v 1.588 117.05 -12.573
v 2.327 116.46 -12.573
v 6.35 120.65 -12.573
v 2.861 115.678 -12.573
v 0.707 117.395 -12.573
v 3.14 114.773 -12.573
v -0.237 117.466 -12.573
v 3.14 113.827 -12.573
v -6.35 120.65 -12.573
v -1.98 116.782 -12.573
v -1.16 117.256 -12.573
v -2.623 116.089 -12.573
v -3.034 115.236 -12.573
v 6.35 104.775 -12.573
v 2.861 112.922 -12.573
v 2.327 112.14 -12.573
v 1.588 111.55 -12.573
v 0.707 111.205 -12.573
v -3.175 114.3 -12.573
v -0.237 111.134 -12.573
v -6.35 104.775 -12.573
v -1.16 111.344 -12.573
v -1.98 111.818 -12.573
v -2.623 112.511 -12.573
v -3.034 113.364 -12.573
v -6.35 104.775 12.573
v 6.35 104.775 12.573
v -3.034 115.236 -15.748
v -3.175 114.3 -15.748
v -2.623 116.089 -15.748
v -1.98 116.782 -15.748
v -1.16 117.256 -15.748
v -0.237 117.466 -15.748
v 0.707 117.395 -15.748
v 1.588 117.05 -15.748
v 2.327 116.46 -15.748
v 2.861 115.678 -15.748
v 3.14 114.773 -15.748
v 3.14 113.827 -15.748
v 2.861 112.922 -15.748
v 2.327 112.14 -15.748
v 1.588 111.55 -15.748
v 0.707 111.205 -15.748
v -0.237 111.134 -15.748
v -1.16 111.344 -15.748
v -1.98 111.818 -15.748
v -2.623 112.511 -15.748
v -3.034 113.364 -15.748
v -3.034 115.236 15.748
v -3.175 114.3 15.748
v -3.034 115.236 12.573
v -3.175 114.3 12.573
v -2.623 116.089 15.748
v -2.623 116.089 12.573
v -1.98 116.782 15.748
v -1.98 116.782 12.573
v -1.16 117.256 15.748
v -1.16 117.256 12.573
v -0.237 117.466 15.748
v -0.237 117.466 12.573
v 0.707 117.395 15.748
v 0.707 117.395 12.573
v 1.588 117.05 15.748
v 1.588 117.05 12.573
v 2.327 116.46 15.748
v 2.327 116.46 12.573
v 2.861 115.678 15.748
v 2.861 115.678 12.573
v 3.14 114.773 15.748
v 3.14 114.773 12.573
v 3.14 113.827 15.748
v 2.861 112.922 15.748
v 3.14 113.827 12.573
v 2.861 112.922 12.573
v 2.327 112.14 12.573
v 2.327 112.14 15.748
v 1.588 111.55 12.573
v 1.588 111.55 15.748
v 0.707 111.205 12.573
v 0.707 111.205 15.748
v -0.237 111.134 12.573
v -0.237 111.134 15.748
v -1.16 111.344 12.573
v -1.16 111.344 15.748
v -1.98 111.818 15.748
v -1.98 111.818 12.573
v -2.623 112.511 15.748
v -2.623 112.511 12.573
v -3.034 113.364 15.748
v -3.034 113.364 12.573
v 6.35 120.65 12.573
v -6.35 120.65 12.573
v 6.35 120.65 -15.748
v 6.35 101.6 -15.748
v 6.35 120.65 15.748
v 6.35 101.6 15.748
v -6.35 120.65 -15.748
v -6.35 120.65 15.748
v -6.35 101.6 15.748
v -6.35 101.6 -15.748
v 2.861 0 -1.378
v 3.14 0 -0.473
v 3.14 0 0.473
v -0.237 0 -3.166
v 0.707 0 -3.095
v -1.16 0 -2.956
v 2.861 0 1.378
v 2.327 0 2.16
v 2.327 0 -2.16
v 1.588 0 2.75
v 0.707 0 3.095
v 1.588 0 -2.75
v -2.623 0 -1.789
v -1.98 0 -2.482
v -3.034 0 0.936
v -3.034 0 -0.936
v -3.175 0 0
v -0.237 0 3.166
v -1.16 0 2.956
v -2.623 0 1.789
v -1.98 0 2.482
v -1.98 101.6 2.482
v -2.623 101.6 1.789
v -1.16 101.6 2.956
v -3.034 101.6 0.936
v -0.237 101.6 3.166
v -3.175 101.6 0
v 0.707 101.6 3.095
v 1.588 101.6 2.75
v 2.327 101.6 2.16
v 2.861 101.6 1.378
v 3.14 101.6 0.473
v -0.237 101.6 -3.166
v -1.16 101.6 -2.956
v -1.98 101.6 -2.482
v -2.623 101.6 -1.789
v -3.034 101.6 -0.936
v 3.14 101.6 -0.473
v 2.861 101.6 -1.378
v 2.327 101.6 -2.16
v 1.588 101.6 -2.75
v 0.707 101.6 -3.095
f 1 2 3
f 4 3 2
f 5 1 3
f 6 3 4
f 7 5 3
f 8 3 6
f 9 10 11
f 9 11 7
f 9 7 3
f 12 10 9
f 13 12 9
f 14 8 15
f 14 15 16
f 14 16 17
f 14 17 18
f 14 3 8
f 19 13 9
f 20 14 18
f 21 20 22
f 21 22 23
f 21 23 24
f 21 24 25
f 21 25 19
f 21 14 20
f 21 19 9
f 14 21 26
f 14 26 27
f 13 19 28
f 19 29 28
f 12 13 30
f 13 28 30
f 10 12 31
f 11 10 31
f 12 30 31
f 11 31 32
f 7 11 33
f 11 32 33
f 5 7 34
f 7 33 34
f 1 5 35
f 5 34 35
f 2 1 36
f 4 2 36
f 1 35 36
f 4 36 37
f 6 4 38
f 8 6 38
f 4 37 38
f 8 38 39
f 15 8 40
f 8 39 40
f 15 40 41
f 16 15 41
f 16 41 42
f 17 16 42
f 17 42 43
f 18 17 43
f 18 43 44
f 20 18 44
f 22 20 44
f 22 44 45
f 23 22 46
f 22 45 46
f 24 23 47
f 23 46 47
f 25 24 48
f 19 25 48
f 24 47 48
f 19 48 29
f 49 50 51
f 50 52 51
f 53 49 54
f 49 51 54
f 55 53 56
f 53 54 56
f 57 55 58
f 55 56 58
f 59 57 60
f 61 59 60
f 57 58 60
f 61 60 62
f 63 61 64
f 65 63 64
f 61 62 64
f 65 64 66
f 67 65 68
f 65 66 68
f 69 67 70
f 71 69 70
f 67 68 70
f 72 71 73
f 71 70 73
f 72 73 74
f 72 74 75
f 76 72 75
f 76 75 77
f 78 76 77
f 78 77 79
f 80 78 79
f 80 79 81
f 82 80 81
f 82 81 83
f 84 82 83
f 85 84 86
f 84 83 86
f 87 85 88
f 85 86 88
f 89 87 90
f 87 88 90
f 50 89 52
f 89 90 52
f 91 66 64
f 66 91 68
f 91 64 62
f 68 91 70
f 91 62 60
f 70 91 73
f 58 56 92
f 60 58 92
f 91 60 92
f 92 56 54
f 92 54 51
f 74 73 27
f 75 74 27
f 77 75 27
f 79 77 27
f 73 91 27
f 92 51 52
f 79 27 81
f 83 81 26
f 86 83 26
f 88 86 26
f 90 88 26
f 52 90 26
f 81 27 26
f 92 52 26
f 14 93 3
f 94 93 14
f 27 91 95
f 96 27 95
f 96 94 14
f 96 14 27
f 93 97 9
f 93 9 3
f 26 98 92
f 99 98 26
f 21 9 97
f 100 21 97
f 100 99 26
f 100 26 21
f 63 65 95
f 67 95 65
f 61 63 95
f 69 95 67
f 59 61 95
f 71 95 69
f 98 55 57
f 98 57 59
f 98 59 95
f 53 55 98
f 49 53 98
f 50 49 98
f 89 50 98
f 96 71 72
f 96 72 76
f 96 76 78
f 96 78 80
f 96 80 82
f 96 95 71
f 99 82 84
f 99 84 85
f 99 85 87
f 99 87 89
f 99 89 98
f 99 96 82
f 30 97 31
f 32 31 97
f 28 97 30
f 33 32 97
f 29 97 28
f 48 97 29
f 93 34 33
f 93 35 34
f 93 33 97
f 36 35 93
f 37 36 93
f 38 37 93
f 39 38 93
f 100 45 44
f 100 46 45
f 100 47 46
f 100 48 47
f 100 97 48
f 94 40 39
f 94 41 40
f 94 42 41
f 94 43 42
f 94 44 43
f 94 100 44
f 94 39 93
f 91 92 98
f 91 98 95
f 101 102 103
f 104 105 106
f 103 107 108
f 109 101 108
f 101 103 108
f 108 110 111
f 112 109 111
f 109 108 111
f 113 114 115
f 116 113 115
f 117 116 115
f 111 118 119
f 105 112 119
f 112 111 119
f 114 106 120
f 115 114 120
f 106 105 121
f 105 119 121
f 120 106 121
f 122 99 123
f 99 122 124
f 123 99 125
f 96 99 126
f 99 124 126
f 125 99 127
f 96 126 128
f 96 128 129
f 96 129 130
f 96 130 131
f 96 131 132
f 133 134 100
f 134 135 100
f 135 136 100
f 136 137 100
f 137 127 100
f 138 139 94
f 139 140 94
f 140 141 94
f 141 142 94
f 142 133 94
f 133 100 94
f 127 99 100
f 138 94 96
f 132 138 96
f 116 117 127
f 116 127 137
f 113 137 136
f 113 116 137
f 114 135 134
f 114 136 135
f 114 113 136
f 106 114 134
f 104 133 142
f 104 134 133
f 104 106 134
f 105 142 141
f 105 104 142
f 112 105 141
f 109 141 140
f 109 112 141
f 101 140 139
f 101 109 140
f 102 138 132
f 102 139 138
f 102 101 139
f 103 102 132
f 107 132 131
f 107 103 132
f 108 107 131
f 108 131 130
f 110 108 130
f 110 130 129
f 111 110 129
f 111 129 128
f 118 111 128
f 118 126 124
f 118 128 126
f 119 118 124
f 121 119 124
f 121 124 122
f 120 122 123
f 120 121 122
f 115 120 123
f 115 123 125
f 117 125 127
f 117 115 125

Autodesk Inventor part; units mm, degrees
ref_plane "YZ Plane" through (0, 0, 0) normal (1, 0, 0) x (0, 1, 0)
ref_plane "XZ Plane" through (0, 0, 0) normal (0, 1, 0) x (-1, 0, 0)
ref_plane "XY Plane" through (0, 0, 0) normal (0, 0, 1) x (1, 0, 0)
sketch "Sketch1" plane through (0, 0, 0) normal (0, 1, 0) x (-1, 0, 0)
  circle A0 centre (0, 0) radius 3.175
  dimension "d0" = 6.35
extrude "Extrusion1" add sketch "Sketch1" along normal blind 101.6
sketch "Sketch2" plane through (0, 101.6, 0) normal (0, 1, 0) x (1, 0, 0)
  line L0 (6.35, -15.748) -> (-6.35, -15.748)
  line L1 (-6.35, -15.748) -> (-6.35, 15.748)
  line L2 (-6.35, 15.748) -> (6.35, 15.748)
  line L3 (6.35, 15.748) -> (6.35, -15.748)
  line L4 (6.35, -15.748) -> (-6.35, 15.748) construction
  line L5 (-6.35, -15.748) -> (6.35, 15.748) construction
  point P0 (0, 0)
  dimension "d3" = 12.7
  dimension "d4" = 31.496
extrude "Extrusion2" add sketch "Sketch2" along normal blind 3.175
sketch "Sketch3" plane through (0, 104.775, 0) normal (0, 1, 0) x (1, 0, 0)
  point P0 (0, 0)
sketch "Sketch4" plane through (0, 104.775, 0) normal (0, 1, 0) x (1, 0, 0)
  line L0 (6.35, -15.748) -> (6.35, 15.748) projected
  line L1 (-6.35, -15.748) -> (6.35, -15.748)
  line L2 (6.35, -15.748) -> (6.35, -12.573)
  line L3 (6.35, -12.573) -> (-6.35, -12.573)
  line L4 (-6.35, -12.573) -> (-6.35, -15.748)
  line L5 (-6.35, 15.748) -> (6.35, 15.748)
  line L6 (6.35, 15.748) -> (6.35, 12.573)
  line L7 (6.35, 12.573) -> (-6.35, 12.573)
  line L8 (-6.35, 12.573) -> (-6.35, 15.748)
  line L9 (6.35, 15.748) -> (-6.35, 15.748) projected
  point P0 (0, 0)
  dimension "d7" = 3.175
  dimension "d8" = 3.175
  dimension "d9" = 0
extrude "Extrusion3" add sketch "Sketch4" along normal blind 15.875
sketch "Sketch5" plane through (6.35, 101.6, -15.748) normal (0, 0, -1) x (-1, 0, 0)
  circle A0 centre (6.35, 12.7) radius 3.175
  line L0 (12.7, 0) -> (0, 0) projected
  point P0 (6.35, -101.6)
  dimension "d12" = 6.35
  dimension "d13" = 12.7
extrude "Extrusion4" cut sketch "Sketch5" against normal blind 50.8
properties part number "PC3.5-ROD"
